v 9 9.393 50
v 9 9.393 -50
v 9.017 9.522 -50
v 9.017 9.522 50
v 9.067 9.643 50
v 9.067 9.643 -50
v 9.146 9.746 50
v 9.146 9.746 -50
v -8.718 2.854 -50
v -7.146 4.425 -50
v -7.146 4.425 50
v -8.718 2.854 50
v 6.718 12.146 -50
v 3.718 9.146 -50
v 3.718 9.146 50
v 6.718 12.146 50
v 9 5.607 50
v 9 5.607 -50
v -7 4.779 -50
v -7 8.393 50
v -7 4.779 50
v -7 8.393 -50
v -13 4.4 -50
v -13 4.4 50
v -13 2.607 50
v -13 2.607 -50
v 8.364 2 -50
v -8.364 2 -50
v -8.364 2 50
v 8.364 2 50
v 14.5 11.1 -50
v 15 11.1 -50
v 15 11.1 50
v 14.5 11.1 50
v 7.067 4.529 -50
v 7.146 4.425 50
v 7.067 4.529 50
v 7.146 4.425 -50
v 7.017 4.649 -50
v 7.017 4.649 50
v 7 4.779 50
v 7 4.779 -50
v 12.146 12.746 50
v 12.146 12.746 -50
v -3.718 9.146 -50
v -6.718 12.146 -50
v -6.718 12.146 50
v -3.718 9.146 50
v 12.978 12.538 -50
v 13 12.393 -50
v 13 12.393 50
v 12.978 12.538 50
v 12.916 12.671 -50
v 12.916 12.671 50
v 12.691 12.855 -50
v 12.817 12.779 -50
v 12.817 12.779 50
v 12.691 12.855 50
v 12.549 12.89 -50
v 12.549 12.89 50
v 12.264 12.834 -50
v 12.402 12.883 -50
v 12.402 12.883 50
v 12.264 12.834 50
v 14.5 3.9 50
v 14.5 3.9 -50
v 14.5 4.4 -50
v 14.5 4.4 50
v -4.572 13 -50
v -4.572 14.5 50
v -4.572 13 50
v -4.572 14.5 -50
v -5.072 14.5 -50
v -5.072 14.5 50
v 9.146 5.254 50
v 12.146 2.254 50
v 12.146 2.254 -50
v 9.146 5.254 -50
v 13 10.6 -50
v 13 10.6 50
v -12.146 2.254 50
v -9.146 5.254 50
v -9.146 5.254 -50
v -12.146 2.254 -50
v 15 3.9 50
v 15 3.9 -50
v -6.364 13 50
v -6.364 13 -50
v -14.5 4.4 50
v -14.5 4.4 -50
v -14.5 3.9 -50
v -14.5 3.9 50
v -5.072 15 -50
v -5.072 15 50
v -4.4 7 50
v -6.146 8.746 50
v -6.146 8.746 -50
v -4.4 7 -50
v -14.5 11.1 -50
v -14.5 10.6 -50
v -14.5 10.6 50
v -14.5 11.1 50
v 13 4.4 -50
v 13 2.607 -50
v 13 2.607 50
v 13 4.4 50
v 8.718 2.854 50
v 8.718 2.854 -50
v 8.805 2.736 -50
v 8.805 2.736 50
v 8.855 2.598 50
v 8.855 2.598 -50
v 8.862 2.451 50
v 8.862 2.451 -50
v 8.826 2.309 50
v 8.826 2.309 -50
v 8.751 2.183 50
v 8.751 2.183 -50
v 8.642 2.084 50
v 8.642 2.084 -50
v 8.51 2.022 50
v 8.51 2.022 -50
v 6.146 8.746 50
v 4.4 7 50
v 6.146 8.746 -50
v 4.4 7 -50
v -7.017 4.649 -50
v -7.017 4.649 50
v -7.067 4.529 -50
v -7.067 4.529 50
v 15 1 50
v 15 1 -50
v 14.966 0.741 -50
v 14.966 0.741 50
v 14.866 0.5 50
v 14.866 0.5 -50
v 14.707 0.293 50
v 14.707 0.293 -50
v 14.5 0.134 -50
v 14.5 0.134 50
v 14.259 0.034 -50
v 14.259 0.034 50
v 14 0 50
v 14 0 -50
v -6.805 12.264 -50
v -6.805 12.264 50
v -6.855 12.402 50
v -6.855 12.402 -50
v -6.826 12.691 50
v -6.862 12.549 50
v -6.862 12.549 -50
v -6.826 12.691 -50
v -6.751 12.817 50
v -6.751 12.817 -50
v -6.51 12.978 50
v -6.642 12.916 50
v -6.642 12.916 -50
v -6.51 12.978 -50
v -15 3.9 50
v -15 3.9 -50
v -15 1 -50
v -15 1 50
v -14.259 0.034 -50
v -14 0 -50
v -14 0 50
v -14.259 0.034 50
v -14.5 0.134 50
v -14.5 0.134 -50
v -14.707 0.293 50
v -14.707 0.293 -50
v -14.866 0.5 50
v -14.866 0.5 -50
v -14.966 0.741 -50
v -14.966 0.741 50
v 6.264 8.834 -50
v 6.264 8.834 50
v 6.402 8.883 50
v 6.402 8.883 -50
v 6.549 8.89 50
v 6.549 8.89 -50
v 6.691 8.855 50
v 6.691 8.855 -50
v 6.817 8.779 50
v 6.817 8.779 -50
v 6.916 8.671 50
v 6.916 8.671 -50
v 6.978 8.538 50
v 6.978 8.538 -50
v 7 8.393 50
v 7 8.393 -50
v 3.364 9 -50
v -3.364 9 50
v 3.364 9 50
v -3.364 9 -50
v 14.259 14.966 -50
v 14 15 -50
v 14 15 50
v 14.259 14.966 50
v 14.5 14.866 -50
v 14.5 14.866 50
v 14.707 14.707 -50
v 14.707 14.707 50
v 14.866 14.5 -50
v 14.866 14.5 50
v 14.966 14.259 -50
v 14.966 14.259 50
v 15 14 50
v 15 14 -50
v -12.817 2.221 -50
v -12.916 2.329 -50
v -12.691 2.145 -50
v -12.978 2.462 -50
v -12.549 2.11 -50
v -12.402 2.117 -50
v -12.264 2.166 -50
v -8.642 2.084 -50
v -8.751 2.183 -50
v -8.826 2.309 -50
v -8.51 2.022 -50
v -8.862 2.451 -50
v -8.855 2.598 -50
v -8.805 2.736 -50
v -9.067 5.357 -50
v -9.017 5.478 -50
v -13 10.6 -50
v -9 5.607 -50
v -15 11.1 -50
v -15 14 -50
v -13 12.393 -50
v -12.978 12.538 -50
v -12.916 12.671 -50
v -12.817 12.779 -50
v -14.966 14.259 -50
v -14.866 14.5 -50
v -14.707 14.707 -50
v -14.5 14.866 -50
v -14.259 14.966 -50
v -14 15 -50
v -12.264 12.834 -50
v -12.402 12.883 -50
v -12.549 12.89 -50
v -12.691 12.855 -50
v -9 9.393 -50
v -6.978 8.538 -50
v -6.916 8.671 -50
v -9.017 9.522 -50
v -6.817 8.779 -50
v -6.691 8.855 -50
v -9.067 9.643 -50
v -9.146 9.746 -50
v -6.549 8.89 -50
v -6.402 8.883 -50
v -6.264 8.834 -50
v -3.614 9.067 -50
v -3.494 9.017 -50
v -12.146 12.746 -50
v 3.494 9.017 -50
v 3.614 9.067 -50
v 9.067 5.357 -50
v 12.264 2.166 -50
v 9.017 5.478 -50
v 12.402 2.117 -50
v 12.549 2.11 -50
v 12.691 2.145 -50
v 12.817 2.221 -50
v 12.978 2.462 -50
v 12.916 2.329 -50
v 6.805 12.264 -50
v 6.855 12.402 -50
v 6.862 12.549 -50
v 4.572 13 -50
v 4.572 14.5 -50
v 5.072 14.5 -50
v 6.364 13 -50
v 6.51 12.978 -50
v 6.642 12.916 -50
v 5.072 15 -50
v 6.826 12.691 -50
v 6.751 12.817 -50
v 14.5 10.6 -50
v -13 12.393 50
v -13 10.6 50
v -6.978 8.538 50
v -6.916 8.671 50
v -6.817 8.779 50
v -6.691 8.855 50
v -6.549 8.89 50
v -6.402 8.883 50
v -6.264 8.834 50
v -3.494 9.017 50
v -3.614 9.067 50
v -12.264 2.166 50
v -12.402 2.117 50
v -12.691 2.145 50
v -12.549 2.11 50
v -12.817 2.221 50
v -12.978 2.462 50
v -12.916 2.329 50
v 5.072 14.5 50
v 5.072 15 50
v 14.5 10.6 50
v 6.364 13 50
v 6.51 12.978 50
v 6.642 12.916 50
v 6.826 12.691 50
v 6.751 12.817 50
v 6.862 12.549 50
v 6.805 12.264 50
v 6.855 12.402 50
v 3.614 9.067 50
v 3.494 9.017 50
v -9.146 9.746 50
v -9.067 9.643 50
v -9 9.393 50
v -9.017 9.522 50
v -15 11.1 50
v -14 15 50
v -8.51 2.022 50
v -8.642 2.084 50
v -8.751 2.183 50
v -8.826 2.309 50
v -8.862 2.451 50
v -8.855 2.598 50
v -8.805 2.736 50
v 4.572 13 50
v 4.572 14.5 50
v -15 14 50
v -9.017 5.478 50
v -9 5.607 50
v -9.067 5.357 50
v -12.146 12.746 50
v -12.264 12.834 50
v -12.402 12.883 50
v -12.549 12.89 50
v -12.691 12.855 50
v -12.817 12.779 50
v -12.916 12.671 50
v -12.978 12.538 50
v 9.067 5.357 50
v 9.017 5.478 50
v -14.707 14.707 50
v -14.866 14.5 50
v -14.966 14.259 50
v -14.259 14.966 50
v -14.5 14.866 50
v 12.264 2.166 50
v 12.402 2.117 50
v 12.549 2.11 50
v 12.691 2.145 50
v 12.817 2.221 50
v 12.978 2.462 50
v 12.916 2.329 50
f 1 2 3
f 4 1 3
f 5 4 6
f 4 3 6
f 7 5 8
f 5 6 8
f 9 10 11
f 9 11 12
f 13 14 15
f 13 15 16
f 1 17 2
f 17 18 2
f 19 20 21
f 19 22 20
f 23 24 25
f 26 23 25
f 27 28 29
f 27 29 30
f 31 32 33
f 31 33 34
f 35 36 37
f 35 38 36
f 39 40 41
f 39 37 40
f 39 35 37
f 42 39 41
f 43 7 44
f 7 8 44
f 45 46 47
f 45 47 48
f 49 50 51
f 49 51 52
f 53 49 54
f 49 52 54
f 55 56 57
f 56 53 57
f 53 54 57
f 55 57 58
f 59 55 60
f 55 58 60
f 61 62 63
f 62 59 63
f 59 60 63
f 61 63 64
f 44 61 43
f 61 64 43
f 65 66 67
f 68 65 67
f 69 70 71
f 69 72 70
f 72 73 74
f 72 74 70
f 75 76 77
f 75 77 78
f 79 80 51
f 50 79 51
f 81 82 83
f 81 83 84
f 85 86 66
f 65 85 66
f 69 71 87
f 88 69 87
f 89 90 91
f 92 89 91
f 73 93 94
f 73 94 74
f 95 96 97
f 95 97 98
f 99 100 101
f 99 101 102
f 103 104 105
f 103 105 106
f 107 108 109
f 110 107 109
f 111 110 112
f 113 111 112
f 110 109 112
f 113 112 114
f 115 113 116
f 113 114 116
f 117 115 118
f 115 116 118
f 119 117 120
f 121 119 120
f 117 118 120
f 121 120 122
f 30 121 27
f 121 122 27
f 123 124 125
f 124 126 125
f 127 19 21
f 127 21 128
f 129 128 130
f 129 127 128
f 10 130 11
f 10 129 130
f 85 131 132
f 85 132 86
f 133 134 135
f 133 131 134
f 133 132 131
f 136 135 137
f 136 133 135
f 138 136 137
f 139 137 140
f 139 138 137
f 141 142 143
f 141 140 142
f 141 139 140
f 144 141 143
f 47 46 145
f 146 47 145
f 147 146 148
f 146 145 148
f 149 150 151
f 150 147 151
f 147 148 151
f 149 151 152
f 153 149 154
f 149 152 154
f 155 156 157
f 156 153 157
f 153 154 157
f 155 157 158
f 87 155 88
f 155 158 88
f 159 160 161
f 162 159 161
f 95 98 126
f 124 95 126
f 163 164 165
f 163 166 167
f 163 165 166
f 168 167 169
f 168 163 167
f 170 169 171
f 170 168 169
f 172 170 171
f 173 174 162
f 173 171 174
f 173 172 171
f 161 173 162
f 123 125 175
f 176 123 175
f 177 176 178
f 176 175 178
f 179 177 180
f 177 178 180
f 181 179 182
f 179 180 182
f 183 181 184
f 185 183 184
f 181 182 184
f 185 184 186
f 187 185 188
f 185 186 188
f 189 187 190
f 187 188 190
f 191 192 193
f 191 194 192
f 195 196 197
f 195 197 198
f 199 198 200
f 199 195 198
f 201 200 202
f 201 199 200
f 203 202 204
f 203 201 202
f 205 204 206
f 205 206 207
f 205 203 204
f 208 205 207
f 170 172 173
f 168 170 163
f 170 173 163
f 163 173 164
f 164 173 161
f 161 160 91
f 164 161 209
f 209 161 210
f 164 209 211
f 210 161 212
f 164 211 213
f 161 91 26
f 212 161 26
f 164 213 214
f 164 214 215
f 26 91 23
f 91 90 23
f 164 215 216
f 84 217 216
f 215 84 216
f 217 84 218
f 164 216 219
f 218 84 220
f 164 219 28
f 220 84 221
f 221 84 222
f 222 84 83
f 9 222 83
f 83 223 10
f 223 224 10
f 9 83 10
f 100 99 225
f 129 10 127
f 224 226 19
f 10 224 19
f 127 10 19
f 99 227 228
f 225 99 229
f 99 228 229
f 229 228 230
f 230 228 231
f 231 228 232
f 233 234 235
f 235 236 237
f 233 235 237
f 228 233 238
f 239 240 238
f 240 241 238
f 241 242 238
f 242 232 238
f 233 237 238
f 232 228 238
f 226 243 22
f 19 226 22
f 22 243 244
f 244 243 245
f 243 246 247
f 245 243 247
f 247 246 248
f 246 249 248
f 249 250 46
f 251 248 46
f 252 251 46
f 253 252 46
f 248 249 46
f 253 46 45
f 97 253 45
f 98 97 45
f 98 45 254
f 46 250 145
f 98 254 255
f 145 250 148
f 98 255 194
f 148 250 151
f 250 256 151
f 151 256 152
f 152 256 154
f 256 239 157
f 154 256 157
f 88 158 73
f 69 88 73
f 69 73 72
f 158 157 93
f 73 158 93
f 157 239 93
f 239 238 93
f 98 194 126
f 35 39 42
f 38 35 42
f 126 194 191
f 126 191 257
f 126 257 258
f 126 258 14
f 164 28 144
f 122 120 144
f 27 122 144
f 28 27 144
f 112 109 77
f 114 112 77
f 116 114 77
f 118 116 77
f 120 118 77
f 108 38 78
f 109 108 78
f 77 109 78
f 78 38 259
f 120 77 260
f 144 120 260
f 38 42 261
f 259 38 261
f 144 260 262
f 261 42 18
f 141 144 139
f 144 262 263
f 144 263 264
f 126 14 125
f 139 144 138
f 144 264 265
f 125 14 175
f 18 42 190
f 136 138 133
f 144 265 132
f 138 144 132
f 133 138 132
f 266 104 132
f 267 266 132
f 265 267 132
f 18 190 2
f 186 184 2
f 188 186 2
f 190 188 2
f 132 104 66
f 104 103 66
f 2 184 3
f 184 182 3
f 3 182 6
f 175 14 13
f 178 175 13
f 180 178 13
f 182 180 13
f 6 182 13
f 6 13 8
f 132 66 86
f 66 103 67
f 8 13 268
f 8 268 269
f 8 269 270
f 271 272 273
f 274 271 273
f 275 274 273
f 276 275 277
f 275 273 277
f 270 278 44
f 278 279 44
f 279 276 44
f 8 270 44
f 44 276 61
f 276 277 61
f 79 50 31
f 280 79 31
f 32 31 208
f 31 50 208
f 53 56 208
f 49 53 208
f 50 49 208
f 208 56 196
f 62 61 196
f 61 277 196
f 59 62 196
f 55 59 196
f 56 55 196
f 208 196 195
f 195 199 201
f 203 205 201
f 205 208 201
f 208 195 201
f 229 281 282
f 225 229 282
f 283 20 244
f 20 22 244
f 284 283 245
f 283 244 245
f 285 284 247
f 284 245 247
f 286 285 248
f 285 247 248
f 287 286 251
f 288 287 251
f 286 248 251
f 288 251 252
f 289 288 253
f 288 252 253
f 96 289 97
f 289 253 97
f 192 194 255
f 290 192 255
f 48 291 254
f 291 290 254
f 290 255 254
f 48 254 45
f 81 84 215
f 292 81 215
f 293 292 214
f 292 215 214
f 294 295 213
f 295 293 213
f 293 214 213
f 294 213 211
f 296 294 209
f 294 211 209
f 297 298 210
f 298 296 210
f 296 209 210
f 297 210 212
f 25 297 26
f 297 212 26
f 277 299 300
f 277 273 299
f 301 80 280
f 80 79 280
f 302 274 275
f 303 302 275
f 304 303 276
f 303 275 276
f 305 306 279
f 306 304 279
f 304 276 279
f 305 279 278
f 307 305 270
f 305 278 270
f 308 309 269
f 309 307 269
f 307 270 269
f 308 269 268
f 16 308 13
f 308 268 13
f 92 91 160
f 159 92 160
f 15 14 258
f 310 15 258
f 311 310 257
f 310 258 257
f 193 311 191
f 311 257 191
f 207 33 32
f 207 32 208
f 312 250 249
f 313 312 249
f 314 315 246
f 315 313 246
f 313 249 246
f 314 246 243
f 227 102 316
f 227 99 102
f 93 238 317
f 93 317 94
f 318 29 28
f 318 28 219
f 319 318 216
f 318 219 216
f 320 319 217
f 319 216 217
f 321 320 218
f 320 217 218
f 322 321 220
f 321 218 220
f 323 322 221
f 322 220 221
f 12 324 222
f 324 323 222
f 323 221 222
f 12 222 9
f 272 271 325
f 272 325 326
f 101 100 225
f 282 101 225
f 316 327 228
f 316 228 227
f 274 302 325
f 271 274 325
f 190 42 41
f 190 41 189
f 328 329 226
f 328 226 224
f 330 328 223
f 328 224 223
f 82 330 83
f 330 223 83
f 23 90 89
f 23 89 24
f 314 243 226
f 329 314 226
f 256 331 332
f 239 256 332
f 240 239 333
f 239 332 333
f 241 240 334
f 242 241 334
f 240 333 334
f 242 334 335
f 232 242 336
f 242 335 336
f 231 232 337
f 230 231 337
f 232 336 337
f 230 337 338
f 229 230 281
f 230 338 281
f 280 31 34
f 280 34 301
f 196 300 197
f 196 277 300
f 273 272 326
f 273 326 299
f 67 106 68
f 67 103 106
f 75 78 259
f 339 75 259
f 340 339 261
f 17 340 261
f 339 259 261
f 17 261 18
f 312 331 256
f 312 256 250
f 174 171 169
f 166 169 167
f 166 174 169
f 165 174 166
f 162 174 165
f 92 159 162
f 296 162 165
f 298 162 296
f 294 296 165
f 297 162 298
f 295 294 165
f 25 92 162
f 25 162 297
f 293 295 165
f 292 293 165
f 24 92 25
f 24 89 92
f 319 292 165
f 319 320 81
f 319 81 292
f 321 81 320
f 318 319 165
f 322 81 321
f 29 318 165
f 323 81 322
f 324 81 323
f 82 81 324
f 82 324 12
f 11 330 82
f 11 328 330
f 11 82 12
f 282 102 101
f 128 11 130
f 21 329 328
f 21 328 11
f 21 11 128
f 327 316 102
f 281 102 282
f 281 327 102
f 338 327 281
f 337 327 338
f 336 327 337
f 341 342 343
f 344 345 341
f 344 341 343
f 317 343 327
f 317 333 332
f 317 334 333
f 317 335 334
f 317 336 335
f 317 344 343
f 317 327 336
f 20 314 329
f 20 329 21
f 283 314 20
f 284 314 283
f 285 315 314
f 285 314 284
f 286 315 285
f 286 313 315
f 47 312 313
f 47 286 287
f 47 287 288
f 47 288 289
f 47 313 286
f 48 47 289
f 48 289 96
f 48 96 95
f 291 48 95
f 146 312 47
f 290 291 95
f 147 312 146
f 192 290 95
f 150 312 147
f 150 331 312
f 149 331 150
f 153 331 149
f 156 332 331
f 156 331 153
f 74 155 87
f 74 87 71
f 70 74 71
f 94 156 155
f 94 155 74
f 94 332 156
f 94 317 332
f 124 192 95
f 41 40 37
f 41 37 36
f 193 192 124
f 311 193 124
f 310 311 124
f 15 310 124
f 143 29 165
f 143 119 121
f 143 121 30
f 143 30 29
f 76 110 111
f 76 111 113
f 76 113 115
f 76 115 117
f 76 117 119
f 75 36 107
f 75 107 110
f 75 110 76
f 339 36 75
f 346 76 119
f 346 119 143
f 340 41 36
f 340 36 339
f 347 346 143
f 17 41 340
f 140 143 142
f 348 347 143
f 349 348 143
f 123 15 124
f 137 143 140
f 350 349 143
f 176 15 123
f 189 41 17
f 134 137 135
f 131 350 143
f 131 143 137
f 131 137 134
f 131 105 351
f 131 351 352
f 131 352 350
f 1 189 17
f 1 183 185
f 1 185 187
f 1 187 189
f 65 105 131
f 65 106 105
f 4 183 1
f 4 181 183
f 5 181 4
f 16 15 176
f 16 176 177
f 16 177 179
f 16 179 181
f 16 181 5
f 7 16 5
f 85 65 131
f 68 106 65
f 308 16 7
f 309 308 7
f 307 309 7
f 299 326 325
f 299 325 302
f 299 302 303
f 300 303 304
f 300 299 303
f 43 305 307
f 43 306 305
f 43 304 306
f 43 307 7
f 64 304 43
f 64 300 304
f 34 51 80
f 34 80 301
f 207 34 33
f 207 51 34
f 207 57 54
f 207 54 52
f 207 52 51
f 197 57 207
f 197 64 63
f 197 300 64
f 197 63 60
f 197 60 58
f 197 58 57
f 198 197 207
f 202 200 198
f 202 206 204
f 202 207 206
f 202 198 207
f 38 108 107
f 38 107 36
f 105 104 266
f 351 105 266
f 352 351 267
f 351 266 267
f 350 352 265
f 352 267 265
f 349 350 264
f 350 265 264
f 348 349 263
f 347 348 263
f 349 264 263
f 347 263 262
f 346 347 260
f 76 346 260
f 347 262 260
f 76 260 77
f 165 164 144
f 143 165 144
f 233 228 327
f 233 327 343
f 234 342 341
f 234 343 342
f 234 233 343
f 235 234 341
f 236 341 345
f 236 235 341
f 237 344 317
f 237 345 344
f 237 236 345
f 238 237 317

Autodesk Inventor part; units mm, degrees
ref_plane "YZ Plane" through (0, 0, 0) normal (1, 0, 0) x (0, 1, 0)
ref_plane "XZ Plane" through (0, 0, 0) normal (0, 1, 0) x (-1, 0, 0)
ref_plane "XY Plane" through (0, 0, 0) normal (0, 0, 1) x (1, 0, 0)
sketch "Sketch1" plane through (0, 0, 0) normal (0, 0, 1) x (1, 0, 0)
  line L0 (-15, 0) -> (-15, 15) construction
  line L1 (-15, 15) -> (-4.5716, 15) construction
  line L2 (-15, 10.6) -> (-15, 4.4) construction
  line L3 (-15, 10.6) -> (-14.5, 10.6) construction
  line L4 (-14.5, 10.6) -> (-14.5, 11.1)
  line L5 (-14.5, 11.1) -> (-15, 11.1)
  line L6 (-15, 11.1) -> (-15, 10.6) construction
  line L7 (-14.5, 10.6) -> (-13, 10.6)
  line L8 (-15, 15) -> (-15, 11.1)
  line L9 (-13, 13.6) -> (-13, 10.6)
  line L10 (-13, 13.6) -> (-9, 9.6)
  line L11 (-9, 9.6) -> (-9, 7.5)
  line L12 (-15, 7.5) -> (0, 7.5) construction
  line L13 (-9, 7.5) -> (-9, 5.4)
  line L14 (-9, 5.4) -> (-13, 1.4)
  line L15 (-13, 4.4) -> (-13, 1.4)
  line L16 (-15, 4.4) -> (-14.5, 4.4) construction
  line L17 (-14.5, 4.4) -> (-14.5, 3.9)
  line L18 (-14.5, 3.9) -> (-15, 3.9)
  line L19 (-15, 3.9) -> (-15, 4.4) construction
  line L20 (-14.5, 4.4) -> (-13, 4.4)
  line L21 (-4.5716, 15) -> (-5.0716, 15) construction
  line L22 (-5.0716, 15) -> (-5.0716, 14.5)
  line L23 (-5.0716, 14.5) -> (-4.5716, 14.5)
  line L24 (-4.5716, 14.5) -> (-4.5716, 15) construction
  line L25 (-4.5716, 14.5) -> (-4.5716, 13)
  line L26 (-4.5716, 13) -> (-7.5716, 13)
  line L27 (-7.5716, 13) -> (-3.5716, 9)
  line L28 (-3.5716, 9) -> (0, 9)
  line L29 (-15, 3.9) -> (-15, 0)
  line L30 (-15, 0) -> (0, 0)
  line L31 (-4.4, 7) -> (0, 7)
  line L32 (-7, 9.6) -> (-4.4, 7)
  line L33 (-7, 9.6) -> (-7, 4.5716)
  line L34 (-7, 4.5716) -> (-9.5716, 2)
  line L35 (-9.5716, 2) -> (0, 2)
  line L36 (0, 2) -> (0, 0)
  line L37 (0, 9) -> (0, 7)
  line L38 (-15, 15) -> (-5.0716, 15)
  point P0 (-15, 10.85)
  point P1 (-9, 6.45)
  point P2 (-9, 8.55)
  point P3 (-1.7858, 9)
  point P4 (-5.5716, 11)
  dimension "d78" = 15
  dimension "d87" = 6.2
  dimension "d89" = 15
  dimension "d91" = 0.5
  dimension "d92" = 2
  dimension "d93" = 6
  dimension "d96" = 45
  dimension "d97" = 3
  dimension "d98" = 45
  dimension "d121" = 2
  dimension "d122" = 2
  dimension "d124" = 2
  dimension "d126" = 2
  dimension "d127" = 2
extrude "Extrusion1" add sketch "Sketch1" along normal mid plane 100
mirror "Mirror1" about plane through (0, 0, 0) normal (1, 0, 0) of "Extrusion1"
fillet "Fillet1" radius 1 4 edges at (-15, 15, 0) (15, 15, 0) (15, 0, 0) (-15, 0, 0)
fillet "Fillet2" radius 0.5 18 edges at (-13, 13.6, 0) (-9, 9.6, 0) (-9, 5.4, 0) (-13, 1.4, 0) (-7, 9.6, 0) (-7, 4.5716, 0) (-9.5716, 2, 0) (-3.5716, 9, 0) (9, 5.4, 0) (-7.5716, 13, 0) (3.5716, 9, 0) (9.5716, 2, 0) (7, 4.5716, 0) (7.5716, 13, 0) (13, 1.4, 0) (9, 9.6, 0) (13, 13.6, 0) (7, 9.6, 0)
equation "\"d98\" = d96"
properties part number "15mm" material "Aluminum 6061"
